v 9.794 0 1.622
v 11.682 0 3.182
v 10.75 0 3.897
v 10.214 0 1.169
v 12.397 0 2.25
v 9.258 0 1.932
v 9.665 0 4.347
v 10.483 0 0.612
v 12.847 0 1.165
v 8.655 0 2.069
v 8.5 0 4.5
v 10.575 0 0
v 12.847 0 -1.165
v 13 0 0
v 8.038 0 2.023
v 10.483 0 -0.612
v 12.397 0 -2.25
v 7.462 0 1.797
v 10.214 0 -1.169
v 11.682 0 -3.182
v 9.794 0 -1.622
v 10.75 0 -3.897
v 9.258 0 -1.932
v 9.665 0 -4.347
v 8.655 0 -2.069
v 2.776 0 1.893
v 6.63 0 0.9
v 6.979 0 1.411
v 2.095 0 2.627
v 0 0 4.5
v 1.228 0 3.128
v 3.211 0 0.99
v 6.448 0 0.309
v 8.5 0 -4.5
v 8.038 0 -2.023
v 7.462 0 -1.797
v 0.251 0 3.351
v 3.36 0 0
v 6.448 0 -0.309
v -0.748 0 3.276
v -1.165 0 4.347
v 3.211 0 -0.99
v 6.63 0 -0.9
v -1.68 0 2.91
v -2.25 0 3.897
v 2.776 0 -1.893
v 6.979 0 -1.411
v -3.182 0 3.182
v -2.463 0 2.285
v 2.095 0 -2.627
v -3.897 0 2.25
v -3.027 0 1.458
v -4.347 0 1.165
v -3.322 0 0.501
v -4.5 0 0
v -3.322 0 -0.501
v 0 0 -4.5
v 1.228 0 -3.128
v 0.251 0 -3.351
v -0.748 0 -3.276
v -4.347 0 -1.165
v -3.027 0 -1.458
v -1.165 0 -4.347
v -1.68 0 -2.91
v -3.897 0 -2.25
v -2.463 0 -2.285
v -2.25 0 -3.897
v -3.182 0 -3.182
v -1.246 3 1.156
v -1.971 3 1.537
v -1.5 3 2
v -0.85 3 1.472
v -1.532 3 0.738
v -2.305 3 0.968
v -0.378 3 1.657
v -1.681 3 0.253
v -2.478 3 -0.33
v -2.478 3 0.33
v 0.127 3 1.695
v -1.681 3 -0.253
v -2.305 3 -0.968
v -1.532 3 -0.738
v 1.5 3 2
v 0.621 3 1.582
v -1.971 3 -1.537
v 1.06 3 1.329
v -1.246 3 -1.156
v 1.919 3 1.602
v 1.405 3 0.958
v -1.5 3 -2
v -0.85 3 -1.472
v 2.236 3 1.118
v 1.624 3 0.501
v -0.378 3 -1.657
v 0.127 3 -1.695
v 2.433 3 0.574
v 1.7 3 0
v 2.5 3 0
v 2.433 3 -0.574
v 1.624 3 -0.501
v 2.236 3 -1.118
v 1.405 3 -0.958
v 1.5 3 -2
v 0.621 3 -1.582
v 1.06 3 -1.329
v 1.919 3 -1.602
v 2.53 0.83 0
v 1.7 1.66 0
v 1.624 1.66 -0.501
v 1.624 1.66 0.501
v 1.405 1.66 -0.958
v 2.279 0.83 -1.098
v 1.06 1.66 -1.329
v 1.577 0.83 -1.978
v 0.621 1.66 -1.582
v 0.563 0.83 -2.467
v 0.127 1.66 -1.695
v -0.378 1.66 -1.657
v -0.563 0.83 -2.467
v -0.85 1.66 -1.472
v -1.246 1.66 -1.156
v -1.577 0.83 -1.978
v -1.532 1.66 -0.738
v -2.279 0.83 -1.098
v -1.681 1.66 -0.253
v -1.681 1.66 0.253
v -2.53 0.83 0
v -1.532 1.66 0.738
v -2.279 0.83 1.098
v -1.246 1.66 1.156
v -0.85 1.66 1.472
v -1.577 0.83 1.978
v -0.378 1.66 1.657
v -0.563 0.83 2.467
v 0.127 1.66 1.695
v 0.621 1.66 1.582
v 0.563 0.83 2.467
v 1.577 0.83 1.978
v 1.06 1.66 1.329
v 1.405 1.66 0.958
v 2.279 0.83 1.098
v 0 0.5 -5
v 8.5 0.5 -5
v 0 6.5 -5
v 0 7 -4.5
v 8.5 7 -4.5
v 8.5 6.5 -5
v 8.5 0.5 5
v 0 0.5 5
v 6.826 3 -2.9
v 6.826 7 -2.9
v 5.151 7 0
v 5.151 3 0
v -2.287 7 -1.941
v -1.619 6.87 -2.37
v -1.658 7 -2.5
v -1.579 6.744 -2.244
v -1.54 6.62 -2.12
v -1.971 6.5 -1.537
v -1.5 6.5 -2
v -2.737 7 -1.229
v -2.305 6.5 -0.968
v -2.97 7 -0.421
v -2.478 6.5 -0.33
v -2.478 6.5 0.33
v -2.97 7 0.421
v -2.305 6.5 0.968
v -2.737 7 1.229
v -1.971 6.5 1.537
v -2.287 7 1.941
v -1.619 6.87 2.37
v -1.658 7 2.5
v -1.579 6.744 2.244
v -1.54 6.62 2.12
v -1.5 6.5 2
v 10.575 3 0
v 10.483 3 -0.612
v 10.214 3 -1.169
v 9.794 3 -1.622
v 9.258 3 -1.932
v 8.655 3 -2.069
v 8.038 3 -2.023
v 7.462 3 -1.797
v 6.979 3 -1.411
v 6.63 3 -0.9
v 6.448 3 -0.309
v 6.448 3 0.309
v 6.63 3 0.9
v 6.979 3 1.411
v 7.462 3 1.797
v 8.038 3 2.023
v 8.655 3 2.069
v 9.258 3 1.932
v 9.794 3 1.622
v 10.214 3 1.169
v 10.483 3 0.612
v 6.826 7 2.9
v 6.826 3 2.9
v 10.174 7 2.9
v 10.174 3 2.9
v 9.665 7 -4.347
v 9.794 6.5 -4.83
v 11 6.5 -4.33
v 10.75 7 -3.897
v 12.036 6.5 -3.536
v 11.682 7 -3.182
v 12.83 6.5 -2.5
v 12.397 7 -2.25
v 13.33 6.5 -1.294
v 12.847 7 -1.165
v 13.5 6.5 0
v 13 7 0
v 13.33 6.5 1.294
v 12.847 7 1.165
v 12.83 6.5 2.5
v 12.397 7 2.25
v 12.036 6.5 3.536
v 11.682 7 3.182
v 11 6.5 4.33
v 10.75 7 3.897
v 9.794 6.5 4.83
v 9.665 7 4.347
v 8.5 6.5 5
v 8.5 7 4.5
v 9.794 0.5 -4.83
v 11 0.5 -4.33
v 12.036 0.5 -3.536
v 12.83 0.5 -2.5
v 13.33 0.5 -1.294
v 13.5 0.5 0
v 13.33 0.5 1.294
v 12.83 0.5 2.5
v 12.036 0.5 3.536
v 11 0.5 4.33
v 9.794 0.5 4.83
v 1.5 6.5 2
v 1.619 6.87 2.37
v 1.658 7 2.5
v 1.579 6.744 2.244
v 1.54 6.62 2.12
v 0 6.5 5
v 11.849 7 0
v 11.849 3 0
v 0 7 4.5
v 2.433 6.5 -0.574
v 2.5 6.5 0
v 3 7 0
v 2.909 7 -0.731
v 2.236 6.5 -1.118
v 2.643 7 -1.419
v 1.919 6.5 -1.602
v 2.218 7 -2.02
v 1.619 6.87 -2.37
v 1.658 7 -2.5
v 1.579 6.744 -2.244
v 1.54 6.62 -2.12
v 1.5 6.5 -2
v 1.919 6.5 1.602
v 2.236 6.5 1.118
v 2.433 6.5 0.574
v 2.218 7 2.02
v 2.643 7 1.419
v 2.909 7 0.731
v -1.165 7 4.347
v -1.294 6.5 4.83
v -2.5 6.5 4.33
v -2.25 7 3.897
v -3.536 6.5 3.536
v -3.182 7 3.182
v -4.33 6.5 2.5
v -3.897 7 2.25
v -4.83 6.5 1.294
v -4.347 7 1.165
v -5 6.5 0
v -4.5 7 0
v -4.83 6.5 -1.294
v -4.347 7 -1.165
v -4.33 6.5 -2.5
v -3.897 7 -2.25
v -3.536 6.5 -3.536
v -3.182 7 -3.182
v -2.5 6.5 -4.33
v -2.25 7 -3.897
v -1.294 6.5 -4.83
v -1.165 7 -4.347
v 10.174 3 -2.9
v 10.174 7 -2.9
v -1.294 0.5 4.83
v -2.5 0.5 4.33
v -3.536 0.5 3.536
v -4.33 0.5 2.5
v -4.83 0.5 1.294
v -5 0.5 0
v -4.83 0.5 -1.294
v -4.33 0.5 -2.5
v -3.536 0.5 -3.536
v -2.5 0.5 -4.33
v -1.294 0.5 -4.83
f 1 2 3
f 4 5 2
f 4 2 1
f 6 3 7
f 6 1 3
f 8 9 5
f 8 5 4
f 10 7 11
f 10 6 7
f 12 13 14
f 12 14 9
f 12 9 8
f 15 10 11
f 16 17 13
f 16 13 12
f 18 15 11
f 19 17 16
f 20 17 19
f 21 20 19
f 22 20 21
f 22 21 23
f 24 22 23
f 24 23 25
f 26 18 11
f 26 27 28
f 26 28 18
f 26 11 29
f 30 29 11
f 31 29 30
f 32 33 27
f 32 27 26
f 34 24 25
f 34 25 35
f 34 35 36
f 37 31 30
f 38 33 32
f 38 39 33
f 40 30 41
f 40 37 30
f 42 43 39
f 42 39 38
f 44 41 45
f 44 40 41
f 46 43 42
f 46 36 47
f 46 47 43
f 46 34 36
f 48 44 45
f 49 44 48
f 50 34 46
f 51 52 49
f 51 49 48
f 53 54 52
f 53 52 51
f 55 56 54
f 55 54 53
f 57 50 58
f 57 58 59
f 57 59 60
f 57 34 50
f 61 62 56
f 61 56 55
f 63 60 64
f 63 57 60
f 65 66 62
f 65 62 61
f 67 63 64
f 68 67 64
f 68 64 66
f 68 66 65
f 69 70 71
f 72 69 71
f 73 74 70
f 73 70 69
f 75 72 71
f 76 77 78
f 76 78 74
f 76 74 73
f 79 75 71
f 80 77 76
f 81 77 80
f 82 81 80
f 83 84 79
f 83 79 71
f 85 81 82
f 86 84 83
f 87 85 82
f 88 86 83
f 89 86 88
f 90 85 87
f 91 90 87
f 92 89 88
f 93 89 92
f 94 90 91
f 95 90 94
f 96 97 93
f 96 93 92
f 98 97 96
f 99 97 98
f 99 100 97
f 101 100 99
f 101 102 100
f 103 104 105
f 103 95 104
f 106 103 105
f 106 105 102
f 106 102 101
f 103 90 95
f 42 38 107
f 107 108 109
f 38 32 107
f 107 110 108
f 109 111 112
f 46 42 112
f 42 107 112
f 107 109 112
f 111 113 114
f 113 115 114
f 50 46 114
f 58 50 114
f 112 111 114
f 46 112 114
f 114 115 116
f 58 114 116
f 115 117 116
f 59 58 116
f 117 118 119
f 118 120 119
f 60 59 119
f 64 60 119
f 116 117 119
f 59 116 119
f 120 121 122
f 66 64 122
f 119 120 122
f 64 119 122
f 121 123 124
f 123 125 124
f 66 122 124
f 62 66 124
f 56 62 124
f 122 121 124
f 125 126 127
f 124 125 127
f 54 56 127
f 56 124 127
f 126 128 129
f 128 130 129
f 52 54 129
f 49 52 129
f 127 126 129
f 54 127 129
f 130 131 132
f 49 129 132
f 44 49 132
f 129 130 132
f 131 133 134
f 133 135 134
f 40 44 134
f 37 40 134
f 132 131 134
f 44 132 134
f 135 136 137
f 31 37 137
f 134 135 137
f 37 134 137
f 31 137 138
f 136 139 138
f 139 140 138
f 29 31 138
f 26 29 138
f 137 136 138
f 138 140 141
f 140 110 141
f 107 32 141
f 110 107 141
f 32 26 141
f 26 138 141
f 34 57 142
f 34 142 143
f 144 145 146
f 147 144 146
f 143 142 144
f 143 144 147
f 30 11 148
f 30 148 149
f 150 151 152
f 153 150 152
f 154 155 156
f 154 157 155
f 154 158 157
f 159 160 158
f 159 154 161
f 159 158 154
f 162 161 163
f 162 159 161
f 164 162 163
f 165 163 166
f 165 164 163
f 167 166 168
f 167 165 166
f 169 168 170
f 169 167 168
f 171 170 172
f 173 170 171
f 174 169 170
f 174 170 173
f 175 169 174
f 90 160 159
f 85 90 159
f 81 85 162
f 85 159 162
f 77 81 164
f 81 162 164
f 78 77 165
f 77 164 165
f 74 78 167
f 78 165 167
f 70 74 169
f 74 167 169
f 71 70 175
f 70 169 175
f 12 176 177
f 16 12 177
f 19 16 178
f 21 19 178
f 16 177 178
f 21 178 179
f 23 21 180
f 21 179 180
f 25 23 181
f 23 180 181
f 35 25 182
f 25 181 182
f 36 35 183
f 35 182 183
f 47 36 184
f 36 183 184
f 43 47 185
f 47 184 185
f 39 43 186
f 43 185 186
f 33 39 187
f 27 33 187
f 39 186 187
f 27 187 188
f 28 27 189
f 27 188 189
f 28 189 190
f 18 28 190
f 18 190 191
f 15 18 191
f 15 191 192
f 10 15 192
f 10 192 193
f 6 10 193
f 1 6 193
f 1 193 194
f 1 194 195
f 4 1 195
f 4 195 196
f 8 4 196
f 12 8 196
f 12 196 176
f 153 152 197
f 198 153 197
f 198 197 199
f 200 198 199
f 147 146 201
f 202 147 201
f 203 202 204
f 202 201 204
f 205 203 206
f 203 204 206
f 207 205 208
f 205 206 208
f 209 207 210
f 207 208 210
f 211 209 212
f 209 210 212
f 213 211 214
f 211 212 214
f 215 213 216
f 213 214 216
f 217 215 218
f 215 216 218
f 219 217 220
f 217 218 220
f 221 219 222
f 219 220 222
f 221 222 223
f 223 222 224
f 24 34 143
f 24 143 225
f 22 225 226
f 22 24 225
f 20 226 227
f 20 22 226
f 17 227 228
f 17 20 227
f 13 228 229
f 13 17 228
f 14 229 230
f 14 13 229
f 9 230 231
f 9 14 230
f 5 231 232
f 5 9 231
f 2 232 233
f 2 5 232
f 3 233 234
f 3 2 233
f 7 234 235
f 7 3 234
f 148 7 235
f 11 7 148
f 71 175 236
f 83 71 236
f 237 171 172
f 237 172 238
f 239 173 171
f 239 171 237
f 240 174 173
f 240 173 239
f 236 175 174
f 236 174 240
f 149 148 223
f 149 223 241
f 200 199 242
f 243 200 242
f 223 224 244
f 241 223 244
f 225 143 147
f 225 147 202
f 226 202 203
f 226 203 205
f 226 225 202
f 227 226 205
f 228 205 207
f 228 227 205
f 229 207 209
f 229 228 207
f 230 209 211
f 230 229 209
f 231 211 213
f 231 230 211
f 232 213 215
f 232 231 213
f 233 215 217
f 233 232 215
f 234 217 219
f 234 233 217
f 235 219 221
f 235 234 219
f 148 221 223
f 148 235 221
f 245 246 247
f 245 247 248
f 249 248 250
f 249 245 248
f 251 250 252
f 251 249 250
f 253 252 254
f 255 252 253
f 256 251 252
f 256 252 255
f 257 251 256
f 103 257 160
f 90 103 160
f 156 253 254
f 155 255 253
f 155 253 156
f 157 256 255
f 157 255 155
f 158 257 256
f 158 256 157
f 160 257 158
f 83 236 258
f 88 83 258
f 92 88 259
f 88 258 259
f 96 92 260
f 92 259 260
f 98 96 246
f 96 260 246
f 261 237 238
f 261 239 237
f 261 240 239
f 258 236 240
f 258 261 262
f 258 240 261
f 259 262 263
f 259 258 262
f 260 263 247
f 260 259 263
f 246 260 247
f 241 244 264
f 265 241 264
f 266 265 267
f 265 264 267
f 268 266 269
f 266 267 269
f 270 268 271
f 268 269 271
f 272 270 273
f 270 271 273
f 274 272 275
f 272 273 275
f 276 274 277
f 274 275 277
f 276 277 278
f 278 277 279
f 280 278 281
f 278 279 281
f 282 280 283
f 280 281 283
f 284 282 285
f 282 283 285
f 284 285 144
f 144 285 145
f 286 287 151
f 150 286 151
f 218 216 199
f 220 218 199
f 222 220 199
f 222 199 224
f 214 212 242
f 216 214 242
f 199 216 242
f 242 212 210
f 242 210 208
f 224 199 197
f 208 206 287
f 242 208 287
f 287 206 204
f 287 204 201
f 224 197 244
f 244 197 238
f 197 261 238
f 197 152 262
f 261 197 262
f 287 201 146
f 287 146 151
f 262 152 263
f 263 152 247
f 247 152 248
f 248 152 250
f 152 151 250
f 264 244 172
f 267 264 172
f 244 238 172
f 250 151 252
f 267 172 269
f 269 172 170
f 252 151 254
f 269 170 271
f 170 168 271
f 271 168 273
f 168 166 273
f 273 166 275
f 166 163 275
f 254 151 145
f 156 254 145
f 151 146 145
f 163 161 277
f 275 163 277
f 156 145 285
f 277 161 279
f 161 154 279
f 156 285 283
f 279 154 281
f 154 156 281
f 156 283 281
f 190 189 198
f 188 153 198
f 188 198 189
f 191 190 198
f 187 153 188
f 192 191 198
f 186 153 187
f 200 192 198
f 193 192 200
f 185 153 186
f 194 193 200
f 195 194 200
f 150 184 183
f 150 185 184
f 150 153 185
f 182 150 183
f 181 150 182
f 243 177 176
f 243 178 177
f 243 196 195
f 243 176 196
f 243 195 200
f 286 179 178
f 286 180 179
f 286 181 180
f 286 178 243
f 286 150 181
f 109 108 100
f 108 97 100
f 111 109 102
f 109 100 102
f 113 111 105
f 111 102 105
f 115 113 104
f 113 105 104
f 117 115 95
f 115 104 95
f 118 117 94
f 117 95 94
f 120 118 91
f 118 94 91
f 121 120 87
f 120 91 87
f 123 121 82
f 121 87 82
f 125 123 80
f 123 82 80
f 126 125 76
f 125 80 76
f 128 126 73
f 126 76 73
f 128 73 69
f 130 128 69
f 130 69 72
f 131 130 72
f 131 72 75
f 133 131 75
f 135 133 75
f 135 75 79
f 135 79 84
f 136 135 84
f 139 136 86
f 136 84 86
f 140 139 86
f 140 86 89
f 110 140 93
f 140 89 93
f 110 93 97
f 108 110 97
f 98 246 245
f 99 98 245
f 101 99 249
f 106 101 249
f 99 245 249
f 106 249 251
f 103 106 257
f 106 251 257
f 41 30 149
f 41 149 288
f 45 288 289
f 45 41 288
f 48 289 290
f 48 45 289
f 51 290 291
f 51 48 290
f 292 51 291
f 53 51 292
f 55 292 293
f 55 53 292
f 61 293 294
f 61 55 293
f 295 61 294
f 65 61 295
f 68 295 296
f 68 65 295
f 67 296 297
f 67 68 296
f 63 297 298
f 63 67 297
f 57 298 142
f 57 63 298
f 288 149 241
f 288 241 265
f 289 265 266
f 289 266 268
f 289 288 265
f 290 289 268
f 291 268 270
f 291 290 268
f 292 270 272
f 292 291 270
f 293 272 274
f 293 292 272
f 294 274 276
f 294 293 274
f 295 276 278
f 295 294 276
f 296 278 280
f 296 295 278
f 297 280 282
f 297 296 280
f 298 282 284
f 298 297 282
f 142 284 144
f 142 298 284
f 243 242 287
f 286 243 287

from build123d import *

# Parameters (mm, degrees)
BOSS_EXTRUDE1_DEPTH                                  = 7
CUT_EXTRUDE1_DEPTH                                   = 4
CSK_FOR_M3_HEX_SOCKET_COUNTERSUNK_CAP_SC_D           = 3.4
CSK_FOR_M3_HEX_SOCKET_COUNTERSUNK_CAP_SC_DEPTH       = 7.5
CSK_FOR_M3_HEX_SOCKET_COUNTERSUNK_CAP_SC_CSINK_D     = 6.72
CSK_FOR_M3_HEX_SOCKET_COUNTERSUNK_CAP_SC_CSINK_ANGLE = 90
CSK_FOR_M3_HEX_SOCKET_COUNTERSUNK_CAP_SC_TIP         = 1.021463052
HOLE1_D                                              = 4.15
CUT_EXTRUDE2_DEPTH                                   = 4
CHAMFER1_SIZE                                        = 0.5


with BuildPart() as part:
    # Sketch1 → Boss-Extrude1 (new body)
    with BuildSketch(Plane(origin=(0, 0, 0), x_dir=(1, 0, 0), z_dir=(0, 1, 0))):
        with BuildLine():
            Line((0, 5), (8.5, 5))
            ThreePointArc((8.5, 5), (13.5, 0), (8.5, -5))
            Line((8.5, -5), (0, -5))
            ThreePointArc((0, -5), (-5, 0), (0, 5))
        make_face()
    extrude(amount=BOSS_EXTRUDE1_DEPTH)

    # Sketch2 → Cut-Extrude1 (cut)
    with BuildSketch(Plane(origin=(0, 7, 0), x_dir=(1, 0, 0), z_dir=(0, 1, 0))):
        with BuildLine():
            ThreePointArc((-1.5, 2), (-2.5, 0), (-1.5, -2))
            Line((-1.5, -2), (1.5, -2))
            ThreePointArc((1.5, -2), (2.236067977, -1.118033989), (2.5, 0))
            ThreePointArc((2.5, 0), (2.236067977, 1.118033989), (1.5, 2))
            Line((1.5, 2), (-1.5, 2))
        make_face()
    extrude(amount=-CUT_EXTRUDE1_DEPTH, mode=Mode.SUBTRACT)

    # CSK for M3 Hex Socket Countersunk Cap Screw2
    with Locations(Plane(origin=(0, 0, 0), x_dir=(-1, 0, 0), z_dir=(0, -1, 0))):
        with Locations((0, 0)):
            CounterSinkHole(CSK_FOR_M3_HEX_SOCKET_COUNTERSUNK_CAP_SC_D / 2, CSK_FOR_M3_HEX_SOCKET_COUNTERSUNK_CAP_SC_CSINK_D / 2, depth=CSK_FOR_M3_HEX_SOCKET_COUNTERSUNK_CAP_SC_DEPTH, counter_sink_angle=CSK_FOR_M3_HEX_SOCKET_COUNTERSUNK_CAP_SC_CSINK_ANGLE)
            with Locations((0, 0, -(CSK_FOR_M3_HEX_SOCKET_COUNTERSUNK_CAP_SC_DEPTH + CSK_FOR_M3_HEX_SOCKET_COUNTERSUNK_CAP_SC_TIP / 2))):  # 118° drill point
                Cone(0, CSK_FOR_M3_HEX_SOCKET_COUNTERSUNK_CAP_SC_D / 2, CSK_FOR_M3_HEX_SOCKET_COUNTERSUNK_CAP_SC_TIP, mode=Mode.SUBTRACT)

    # Hole1 (through all)
    with Locations(Plane(origin=(0, 0, 0), x_dir=(-1, 0, 0), z_dir=(0, -1, 0))):
        with Locations((-8.5, 0)):
            Hole(HOLE1_D / 2)

    # Sketch11 → Cut-Extrude2 (cut)
    with BuildSketch(Plane(origin=(0, 7, 0), x_dir=(1, 0, 0), z_dir=(0, 1, 0))):
        Polygon((11.848631561, 0), (10.174315781, 2.9), (6.825684219, 2.9), (5.151368439, 0), (6.825684219, -2.9), (10.174315781, -2.9), align=None)
    extrude(amount=-CUT_EXTRUDE2_DEPTH, mode=Mode.SUBTRACT)

    # Chamfer1
    chamfer1_edges = [part.edges().sort_by_distance(p)[0] for p in [
        (13.5, 7, 0),
        (0, 7, -2),
        (4.25, 7, -5),
        (-2.5, 7, 0),
        (0, 7, 2),
        (2.5, 7, 0),
        (-5, 7, 0),
        (4.25, 0, -5),
        (13.5, 0, 0),
        (4.25, 0, 5),
        (-5, 0, 0),
        (4.25, 7, 5),
    ]]
    chamfer(chamfer1_edges, length=CHAMFER1_SIZE)


solid = part.part
